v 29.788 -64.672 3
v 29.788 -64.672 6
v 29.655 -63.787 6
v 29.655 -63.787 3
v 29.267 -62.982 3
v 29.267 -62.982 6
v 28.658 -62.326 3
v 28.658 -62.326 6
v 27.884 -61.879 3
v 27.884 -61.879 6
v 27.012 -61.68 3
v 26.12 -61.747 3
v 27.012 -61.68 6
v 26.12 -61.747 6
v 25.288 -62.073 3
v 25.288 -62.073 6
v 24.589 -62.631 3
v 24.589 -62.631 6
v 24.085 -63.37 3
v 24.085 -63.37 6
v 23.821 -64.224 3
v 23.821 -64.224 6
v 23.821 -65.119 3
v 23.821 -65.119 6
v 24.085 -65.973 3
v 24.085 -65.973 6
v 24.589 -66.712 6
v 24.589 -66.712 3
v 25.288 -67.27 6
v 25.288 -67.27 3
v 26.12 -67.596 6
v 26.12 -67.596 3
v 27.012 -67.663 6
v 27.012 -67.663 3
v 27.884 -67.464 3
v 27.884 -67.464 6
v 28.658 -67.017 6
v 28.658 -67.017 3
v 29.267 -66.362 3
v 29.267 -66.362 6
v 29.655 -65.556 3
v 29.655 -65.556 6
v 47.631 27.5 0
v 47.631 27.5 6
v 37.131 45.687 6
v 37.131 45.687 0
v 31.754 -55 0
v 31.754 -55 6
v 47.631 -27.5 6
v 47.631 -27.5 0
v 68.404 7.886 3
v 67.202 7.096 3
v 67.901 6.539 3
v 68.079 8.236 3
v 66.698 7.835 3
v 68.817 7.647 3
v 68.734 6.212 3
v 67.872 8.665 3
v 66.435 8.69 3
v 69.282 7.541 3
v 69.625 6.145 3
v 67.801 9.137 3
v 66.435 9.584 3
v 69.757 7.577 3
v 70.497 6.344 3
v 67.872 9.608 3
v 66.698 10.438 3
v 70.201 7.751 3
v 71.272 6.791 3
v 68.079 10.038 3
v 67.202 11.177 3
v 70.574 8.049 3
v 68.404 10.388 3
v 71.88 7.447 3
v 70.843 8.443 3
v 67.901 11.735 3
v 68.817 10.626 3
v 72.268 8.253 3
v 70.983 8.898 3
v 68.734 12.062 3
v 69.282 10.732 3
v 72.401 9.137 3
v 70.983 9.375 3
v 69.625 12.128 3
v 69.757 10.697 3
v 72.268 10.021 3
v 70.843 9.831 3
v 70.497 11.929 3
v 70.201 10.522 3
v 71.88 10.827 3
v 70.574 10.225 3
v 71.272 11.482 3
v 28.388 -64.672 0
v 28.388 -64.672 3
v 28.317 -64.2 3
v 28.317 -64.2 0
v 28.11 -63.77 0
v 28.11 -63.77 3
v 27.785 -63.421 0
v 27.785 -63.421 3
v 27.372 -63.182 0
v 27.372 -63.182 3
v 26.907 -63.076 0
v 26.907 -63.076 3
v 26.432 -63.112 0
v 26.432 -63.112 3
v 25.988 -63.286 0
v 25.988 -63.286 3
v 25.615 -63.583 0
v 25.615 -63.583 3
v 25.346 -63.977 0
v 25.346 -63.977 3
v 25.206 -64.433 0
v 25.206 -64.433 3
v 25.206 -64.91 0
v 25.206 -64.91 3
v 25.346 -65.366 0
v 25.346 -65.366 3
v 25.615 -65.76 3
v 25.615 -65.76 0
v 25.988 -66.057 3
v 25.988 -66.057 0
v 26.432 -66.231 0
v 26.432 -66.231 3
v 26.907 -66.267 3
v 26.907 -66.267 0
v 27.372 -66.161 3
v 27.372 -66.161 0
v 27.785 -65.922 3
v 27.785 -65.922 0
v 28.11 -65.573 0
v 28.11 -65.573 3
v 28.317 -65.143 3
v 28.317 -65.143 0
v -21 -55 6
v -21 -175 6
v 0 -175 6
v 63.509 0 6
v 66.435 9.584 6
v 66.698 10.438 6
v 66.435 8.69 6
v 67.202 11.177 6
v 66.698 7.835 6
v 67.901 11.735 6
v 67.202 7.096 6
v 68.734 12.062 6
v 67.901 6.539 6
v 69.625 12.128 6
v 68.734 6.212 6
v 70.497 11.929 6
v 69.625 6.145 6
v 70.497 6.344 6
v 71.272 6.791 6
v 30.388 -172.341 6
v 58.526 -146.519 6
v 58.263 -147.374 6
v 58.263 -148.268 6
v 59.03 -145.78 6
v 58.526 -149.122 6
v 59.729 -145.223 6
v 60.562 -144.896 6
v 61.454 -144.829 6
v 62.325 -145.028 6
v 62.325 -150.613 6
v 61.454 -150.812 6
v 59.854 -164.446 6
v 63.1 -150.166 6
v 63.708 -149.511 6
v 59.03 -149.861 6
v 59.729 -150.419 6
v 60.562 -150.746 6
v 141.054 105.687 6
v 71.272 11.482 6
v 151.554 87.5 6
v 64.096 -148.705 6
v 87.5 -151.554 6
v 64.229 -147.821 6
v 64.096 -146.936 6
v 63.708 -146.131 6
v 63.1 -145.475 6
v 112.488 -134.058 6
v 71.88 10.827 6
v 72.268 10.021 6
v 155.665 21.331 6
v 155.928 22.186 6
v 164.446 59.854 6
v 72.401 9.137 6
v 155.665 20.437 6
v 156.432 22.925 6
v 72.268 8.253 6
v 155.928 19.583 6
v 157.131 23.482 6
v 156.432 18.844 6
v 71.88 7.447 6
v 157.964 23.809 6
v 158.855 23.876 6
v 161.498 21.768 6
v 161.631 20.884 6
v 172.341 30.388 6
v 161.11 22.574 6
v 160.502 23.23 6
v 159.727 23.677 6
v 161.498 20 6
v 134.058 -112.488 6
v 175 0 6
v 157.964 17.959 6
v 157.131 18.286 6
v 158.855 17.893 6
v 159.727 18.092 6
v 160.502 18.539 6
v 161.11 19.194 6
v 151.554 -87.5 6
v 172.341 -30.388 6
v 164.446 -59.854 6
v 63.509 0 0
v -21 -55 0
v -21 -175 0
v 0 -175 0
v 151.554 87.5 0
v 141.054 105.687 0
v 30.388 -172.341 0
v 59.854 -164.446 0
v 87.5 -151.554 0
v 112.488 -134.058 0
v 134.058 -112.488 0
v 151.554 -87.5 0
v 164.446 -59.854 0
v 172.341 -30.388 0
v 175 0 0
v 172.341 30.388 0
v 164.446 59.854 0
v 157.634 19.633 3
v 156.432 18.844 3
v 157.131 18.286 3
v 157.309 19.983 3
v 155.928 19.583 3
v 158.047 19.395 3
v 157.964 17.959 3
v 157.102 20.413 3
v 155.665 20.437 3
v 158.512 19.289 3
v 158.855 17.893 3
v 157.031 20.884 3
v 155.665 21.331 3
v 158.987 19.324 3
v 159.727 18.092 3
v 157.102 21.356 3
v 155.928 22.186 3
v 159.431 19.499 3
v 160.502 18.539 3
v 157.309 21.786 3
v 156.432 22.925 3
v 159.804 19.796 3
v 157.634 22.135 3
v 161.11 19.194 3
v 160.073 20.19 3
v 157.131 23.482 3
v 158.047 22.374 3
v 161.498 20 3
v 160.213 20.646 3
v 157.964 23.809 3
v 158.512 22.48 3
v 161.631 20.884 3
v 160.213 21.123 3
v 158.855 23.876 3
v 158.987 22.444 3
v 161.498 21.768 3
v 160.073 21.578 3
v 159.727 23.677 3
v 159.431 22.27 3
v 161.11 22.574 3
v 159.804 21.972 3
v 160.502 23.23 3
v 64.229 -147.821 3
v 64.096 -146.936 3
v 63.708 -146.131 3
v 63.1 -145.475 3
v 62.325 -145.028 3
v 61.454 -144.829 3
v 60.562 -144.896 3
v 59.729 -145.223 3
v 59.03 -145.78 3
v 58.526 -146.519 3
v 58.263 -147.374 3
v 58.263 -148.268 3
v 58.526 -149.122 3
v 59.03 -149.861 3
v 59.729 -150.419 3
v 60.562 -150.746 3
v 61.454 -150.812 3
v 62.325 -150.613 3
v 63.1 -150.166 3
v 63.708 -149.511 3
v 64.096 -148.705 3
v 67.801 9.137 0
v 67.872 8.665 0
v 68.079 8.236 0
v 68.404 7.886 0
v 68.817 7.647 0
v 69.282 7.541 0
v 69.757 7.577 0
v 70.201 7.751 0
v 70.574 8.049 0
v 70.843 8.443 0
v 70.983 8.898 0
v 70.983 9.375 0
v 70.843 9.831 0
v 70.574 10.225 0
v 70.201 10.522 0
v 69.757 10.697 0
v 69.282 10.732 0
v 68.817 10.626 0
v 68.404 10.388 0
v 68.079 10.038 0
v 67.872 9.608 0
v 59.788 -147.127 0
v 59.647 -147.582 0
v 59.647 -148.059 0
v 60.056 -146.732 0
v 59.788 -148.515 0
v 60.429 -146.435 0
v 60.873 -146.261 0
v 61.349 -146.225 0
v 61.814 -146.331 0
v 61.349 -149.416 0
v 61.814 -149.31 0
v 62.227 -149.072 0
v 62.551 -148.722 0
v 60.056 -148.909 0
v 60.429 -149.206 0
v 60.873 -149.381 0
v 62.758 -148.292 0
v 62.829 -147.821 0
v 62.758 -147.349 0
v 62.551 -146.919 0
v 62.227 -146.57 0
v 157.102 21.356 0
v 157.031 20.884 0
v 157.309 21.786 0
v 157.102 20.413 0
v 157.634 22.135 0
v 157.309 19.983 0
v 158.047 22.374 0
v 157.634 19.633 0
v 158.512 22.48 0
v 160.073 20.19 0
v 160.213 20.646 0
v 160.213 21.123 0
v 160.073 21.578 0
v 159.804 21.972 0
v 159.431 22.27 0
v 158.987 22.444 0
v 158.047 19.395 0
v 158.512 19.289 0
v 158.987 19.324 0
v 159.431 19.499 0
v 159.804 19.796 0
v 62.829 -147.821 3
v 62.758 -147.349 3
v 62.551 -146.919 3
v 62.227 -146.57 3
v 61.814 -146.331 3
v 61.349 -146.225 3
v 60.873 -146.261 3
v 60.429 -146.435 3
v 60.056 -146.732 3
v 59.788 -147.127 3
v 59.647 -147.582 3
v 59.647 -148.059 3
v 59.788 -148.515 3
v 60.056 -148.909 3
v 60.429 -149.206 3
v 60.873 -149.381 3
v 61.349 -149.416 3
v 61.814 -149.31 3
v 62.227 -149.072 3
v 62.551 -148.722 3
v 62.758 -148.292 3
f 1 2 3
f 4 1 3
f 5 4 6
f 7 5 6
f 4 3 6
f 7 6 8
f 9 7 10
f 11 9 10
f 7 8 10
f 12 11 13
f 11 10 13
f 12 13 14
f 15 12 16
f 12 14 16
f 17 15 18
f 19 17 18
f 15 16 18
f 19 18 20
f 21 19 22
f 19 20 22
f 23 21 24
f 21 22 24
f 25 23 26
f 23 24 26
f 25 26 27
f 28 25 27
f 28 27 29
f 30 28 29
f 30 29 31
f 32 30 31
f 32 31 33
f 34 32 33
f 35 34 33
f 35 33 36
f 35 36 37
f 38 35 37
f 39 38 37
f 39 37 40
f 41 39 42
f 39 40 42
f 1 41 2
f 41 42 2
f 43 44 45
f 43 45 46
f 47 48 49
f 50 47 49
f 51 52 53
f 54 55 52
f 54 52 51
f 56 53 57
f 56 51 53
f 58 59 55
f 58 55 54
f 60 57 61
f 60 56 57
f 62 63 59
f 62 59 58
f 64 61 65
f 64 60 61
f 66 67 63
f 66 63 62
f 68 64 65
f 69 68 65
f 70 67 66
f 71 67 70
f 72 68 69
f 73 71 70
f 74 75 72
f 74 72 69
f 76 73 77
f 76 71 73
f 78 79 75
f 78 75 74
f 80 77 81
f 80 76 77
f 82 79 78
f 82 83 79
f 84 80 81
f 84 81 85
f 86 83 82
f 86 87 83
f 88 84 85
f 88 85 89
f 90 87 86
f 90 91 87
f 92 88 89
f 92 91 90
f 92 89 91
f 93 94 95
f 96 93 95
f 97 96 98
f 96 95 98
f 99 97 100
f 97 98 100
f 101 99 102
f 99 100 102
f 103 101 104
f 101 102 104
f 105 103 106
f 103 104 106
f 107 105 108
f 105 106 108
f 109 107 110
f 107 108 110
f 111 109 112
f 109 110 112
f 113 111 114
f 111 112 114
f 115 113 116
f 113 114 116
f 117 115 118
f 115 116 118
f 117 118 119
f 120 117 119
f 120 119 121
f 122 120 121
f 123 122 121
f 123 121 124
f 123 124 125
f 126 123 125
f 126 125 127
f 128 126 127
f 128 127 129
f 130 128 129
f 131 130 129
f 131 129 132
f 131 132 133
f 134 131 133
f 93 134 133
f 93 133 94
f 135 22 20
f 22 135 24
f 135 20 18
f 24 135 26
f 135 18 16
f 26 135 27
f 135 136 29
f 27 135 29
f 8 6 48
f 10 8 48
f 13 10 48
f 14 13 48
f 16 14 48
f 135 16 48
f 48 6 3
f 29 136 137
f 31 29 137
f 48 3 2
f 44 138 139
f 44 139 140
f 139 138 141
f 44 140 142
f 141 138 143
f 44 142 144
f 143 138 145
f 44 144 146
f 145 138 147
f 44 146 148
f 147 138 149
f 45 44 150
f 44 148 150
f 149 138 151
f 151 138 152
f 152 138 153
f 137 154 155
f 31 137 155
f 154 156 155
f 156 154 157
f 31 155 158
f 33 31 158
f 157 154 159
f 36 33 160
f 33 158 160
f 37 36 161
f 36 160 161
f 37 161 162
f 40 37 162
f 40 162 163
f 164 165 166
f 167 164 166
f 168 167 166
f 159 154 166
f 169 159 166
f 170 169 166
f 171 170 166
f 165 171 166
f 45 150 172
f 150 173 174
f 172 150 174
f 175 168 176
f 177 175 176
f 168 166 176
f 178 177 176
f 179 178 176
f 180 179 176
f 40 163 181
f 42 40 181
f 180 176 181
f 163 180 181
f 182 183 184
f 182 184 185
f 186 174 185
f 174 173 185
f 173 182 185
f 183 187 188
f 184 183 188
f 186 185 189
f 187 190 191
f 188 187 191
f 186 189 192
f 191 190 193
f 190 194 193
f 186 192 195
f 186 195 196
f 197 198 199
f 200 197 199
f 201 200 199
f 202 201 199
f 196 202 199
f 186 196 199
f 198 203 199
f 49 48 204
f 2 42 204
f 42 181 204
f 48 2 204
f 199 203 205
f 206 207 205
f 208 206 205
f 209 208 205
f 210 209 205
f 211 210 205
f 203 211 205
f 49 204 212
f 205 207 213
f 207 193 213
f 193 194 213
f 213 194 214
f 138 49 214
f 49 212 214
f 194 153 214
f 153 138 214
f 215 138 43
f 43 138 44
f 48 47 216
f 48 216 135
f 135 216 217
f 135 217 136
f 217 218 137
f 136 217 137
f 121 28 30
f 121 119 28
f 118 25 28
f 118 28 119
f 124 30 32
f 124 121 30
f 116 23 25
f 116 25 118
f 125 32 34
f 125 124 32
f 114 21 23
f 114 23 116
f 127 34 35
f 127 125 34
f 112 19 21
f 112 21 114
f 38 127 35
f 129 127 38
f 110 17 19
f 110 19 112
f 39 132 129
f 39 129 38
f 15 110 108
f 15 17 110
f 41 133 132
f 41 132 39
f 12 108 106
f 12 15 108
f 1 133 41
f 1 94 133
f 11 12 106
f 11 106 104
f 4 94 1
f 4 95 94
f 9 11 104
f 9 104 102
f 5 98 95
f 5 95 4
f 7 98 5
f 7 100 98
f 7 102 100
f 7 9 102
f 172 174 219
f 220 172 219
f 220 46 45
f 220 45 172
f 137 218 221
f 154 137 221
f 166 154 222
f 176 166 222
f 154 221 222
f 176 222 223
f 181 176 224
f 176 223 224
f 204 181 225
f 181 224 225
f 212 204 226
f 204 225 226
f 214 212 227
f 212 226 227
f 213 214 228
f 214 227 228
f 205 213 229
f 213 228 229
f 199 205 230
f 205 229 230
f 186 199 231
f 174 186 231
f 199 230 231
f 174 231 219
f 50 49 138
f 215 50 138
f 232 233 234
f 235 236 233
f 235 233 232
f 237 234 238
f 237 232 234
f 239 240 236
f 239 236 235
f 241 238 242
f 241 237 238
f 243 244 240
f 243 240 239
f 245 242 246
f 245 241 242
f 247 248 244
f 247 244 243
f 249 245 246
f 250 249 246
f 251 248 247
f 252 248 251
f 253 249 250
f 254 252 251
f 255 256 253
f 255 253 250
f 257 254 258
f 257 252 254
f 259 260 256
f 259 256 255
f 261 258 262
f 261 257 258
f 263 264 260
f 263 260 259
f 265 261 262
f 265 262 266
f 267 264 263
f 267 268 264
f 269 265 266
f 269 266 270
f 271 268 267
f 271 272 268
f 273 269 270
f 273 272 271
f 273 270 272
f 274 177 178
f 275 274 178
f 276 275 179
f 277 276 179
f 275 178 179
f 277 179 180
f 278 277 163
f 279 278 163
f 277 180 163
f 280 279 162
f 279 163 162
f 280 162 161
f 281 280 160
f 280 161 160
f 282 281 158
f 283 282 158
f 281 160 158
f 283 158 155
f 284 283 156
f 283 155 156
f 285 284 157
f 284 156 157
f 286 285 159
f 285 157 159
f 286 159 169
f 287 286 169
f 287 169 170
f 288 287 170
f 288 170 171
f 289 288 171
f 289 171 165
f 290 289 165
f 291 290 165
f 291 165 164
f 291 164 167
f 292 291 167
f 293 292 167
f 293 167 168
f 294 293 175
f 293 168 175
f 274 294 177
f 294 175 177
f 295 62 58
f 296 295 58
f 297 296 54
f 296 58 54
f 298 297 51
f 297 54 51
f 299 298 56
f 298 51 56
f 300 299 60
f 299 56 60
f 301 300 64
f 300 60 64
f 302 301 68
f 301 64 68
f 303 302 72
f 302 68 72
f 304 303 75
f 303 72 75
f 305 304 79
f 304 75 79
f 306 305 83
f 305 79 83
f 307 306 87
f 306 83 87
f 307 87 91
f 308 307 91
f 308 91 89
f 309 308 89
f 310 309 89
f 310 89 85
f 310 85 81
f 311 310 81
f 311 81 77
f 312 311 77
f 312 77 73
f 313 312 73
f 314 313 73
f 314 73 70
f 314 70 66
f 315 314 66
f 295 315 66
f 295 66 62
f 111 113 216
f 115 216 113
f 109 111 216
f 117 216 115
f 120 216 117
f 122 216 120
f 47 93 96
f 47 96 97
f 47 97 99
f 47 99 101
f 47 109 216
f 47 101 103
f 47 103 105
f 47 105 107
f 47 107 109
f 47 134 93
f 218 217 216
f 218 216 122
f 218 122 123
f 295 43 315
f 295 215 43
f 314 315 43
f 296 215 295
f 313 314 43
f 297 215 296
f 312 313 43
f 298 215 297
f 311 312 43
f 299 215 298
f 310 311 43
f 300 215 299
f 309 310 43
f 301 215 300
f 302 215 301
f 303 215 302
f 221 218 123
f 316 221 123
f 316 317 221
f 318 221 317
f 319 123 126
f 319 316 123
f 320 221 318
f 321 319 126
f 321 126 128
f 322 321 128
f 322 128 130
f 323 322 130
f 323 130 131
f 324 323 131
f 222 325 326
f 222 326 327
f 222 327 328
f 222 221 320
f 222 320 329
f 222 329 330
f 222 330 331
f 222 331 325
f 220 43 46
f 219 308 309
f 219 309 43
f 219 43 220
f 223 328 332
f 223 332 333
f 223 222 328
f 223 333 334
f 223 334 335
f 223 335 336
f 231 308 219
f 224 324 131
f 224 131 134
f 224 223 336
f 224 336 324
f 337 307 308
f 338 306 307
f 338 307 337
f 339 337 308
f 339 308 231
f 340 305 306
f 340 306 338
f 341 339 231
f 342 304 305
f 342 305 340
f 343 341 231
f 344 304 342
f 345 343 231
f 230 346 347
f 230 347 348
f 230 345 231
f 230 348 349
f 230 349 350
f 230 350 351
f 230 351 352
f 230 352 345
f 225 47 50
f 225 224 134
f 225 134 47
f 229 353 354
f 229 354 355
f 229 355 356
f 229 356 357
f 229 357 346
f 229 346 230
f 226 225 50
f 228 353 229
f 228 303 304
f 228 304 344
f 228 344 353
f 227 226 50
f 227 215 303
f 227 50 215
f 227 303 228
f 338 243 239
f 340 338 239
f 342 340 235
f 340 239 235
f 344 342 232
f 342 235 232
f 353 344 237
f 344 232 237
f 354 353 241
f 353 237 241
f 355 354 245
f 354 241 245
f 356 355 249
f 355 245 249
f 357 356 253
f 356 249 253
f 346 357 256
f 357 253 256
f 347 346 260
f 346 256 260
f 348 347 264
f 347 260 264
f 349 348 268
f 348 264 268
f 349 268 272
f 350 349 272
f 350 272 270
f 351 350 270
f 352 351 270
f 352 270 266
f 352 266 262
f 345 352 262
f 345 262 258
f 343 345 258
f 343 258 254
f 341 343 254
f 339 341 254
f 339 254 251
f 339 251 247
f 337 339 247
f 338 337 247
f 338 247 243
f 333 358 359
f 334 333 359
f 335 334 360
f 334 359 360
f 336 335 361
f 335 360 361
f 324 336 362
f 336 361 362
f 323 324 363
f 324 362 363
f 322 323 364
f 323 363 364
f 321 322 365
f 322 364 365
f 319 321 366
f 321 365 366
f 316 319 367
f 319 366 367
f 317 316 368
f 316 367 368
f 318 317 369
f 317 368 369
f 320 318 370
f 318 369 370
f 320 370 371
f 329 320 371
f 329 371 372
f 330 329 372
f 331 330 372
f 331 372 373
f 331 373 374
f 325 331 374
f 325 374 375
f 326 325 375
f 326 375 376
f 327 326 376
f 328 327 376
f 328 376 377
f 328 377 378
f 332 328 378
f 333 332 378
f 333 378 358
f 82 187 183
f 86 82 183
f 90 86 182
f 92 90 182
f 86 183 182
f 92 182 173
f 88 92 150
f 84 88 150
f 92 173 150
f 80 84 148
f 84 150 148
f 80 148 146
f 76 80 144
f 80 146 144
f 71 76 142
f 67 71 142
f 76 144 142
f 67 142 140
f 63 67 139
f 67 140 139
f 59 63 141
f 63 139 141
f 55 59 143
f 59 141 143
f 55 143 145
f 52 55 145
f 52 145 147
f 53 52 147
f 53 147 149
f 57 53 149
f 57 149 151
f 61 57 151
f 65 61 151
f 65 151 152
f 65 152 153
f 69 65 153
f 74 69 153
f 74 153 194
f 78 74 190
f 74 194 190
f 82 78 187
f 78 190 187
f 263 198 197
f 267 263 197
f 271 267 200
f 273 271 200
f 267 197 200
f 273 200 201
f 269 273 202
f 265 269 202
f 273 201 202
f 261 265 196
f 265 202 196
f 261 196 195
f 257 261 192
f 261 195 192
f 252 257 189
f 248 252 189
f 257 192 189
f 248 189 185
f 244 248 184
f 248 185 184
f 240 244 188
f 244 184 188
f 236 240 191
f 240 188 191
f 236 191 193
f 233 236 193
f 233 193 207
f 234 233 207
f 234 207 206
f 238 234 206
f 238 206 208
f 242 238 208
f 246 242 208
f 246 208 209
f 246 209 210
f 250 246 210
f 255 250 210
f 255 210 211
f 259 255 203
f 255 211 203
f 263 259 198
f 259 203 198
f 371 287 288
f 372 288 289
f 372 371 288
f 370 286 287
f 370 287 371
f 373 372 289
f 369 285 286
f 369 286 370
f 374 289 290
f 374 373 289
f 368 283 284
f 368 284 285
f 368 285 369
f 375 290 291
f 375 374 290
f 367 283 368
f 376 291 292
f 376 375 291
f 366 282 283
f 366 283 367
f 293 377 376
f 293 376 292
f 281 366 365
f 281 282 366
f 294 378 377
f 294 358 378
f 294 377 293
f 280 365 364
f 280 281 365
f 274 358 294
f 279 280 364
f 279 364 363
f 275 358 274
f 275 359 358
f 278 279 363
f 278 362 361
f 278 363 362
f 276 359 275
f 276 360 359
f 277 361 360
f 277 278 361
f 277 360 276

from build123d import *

# Parameters (mm, degrees)
EXTRUDE_1_DEPTH     = 6
CUT_EXTRUDE_1_DEPTH = 248.560093715
SKETCH_3_W          = 6
SKETCH_3_H          = 120
EXTRUDE_2_DEPTH     = 21
SKETCH_4_W          = 120
SKETCH_4_H          = 6
EXTRUDE_3_DEPTH     = 21
SKETCH_5_R          = 1.6
CUT_EXTRUDE_2_DEPTH = 248.560093715
SKETCH_6_R          = 3
CUT_EXTRUDE_3_DEPTH = 3


with BuildPart() as part:
    # 草圖1 → 填料-伸長1 (new body)
    with BuildSketch(Plane.XY):
        with BuildLine():
            Line((0, 0), (0, -175))
            ThreePointArc((0, -175), (151.554445662, -87.5), (151.554445662, 87.5))
            Line((151.554445662, 87.5), (0, 0))
        make_face()
    extrude(amount=EXTRUDE_1_DEPTH)

    # 草圖2 → 除料-伸長1 (cut, through all)
    with BuildSketch(Plane.XY.offset(6)):
        with BuildLine():
            Line((0, 0), (0, -55))
            ThreePointArc((0, -55), (27.500000113, -47.631397143), (47.631397339, -27.499999773))
            ThreePointArc((47.631397339, -27.499999773), (53.12592048, -14.235047354), (55, 0))
            ThreePointArc((55, 0), (53.125920434, 14.235047524), (47.631397163, 27.500000078))
            Line((47.631397208, 27.5), (0, 0))
        make_face()
        with BuildLine():
            ThreePointArc((0, 55), (-55, 0), (0, -55))
            Line((0, -55), (0, 0))
            Line((0, 0), (47.631397208, 27.5))
            ThreePointArc((47.631397163, 27.500000078), (27.499999961, 47.631397231), (0, 55))
        make_face()
        with BuildLine():
            ThreePointArc((47.631397339, -27.499999773), (27.500000113, -47.631397143), (0, -55))
            Line((0, -55), (31.754264805, -55))
            Line((31.754264805, -55), (47.631397339, -27.499999773))
        make_face()
        with BuildLine():
            ThreePointArc((55, 0), (53.12592048, -14.235047354), (47.631397339, -27.499999773))
            Line((47.631397339, -27.499999773), (63.508529611, 0))
            Line((63.508529611, 0), (47.631397163, 27.500000078))
            ThreePointArc((47.631397163, 27.500000078), (53.125920434, 14.235047524), (55, 0))
        make_face()
    extrude(amount=-CUT_EXTRUDE_1_DEPTH, mode=Mode.SUBTRACT)

    # 草圖3 → 填料-伸長2 (add)
    with BuildSketch(Plane.ZY):
        with Locations((3, -115)):
            Rectangle(SKETCH_3_W, SKETCH_3_H)
    extrude(amount=EXTRUDE_2_DEPTH)

    # 草圖4 → 填料-伸長3 (add)
    with BuildSketch(Plane(origin=(0, 0, 0), x_dir=(0.8660254037844362, 0.5000000000000046, 0), z_dir=(-0.5000000000000044, 0.866025403784436, 0))):
        with Locations((115, -3)):
            Rectangle(SKETCH_4_W, SKETCH_4_H)
    extrude(amount=EXTRUDE_3_DEPTH)

    # 草圖5 → 除料-伸長2 (cut, through all)
    with BuildSketch(Plane.XY.offset(6)):
        with Locations((61.229349178, -147.820725202)):
            Circle(SKETCH_5_R)
        with Locations((26.787840266, -64.671567276)):
            Circle(SKETCH_5_R)
        with Locations(Location((158.63117782, 20.884190755, 0), (0, 0, 180))):
            Circle(SKETCH_5_R)
        with Locations(Location((69.401140296, 9.136833455, 0), (0, 0, 180))):
            Circle(SKETCH_5_R)
    extrude(amount=-CUT_EXTRUDE_2_DEPTH, mode=Mode.SUBTRACT)

    # 草圖6 → 除料-伸長3 (cut)
    with BuildSketch(Plane.XY.offset(6)):
        with Locations((61.229349178, -147.820725202)):
            Circle(SKETCH_6_R)
        with Locations((26.787840266, -64.671567276)):
            Circle(SKETCH_6_R)
        with Locations((69.401140296, 9.136833455)):
            Circle(SKETCH_6_R)
        with Locations((158.63117782, 20.884190755)):
            Circle(SKETCH_6_R)
    extrude(amount=-CUT_EXTRUDE_3_DEPTH, mode=Mode.SUBTRACT)


solid = part.part
